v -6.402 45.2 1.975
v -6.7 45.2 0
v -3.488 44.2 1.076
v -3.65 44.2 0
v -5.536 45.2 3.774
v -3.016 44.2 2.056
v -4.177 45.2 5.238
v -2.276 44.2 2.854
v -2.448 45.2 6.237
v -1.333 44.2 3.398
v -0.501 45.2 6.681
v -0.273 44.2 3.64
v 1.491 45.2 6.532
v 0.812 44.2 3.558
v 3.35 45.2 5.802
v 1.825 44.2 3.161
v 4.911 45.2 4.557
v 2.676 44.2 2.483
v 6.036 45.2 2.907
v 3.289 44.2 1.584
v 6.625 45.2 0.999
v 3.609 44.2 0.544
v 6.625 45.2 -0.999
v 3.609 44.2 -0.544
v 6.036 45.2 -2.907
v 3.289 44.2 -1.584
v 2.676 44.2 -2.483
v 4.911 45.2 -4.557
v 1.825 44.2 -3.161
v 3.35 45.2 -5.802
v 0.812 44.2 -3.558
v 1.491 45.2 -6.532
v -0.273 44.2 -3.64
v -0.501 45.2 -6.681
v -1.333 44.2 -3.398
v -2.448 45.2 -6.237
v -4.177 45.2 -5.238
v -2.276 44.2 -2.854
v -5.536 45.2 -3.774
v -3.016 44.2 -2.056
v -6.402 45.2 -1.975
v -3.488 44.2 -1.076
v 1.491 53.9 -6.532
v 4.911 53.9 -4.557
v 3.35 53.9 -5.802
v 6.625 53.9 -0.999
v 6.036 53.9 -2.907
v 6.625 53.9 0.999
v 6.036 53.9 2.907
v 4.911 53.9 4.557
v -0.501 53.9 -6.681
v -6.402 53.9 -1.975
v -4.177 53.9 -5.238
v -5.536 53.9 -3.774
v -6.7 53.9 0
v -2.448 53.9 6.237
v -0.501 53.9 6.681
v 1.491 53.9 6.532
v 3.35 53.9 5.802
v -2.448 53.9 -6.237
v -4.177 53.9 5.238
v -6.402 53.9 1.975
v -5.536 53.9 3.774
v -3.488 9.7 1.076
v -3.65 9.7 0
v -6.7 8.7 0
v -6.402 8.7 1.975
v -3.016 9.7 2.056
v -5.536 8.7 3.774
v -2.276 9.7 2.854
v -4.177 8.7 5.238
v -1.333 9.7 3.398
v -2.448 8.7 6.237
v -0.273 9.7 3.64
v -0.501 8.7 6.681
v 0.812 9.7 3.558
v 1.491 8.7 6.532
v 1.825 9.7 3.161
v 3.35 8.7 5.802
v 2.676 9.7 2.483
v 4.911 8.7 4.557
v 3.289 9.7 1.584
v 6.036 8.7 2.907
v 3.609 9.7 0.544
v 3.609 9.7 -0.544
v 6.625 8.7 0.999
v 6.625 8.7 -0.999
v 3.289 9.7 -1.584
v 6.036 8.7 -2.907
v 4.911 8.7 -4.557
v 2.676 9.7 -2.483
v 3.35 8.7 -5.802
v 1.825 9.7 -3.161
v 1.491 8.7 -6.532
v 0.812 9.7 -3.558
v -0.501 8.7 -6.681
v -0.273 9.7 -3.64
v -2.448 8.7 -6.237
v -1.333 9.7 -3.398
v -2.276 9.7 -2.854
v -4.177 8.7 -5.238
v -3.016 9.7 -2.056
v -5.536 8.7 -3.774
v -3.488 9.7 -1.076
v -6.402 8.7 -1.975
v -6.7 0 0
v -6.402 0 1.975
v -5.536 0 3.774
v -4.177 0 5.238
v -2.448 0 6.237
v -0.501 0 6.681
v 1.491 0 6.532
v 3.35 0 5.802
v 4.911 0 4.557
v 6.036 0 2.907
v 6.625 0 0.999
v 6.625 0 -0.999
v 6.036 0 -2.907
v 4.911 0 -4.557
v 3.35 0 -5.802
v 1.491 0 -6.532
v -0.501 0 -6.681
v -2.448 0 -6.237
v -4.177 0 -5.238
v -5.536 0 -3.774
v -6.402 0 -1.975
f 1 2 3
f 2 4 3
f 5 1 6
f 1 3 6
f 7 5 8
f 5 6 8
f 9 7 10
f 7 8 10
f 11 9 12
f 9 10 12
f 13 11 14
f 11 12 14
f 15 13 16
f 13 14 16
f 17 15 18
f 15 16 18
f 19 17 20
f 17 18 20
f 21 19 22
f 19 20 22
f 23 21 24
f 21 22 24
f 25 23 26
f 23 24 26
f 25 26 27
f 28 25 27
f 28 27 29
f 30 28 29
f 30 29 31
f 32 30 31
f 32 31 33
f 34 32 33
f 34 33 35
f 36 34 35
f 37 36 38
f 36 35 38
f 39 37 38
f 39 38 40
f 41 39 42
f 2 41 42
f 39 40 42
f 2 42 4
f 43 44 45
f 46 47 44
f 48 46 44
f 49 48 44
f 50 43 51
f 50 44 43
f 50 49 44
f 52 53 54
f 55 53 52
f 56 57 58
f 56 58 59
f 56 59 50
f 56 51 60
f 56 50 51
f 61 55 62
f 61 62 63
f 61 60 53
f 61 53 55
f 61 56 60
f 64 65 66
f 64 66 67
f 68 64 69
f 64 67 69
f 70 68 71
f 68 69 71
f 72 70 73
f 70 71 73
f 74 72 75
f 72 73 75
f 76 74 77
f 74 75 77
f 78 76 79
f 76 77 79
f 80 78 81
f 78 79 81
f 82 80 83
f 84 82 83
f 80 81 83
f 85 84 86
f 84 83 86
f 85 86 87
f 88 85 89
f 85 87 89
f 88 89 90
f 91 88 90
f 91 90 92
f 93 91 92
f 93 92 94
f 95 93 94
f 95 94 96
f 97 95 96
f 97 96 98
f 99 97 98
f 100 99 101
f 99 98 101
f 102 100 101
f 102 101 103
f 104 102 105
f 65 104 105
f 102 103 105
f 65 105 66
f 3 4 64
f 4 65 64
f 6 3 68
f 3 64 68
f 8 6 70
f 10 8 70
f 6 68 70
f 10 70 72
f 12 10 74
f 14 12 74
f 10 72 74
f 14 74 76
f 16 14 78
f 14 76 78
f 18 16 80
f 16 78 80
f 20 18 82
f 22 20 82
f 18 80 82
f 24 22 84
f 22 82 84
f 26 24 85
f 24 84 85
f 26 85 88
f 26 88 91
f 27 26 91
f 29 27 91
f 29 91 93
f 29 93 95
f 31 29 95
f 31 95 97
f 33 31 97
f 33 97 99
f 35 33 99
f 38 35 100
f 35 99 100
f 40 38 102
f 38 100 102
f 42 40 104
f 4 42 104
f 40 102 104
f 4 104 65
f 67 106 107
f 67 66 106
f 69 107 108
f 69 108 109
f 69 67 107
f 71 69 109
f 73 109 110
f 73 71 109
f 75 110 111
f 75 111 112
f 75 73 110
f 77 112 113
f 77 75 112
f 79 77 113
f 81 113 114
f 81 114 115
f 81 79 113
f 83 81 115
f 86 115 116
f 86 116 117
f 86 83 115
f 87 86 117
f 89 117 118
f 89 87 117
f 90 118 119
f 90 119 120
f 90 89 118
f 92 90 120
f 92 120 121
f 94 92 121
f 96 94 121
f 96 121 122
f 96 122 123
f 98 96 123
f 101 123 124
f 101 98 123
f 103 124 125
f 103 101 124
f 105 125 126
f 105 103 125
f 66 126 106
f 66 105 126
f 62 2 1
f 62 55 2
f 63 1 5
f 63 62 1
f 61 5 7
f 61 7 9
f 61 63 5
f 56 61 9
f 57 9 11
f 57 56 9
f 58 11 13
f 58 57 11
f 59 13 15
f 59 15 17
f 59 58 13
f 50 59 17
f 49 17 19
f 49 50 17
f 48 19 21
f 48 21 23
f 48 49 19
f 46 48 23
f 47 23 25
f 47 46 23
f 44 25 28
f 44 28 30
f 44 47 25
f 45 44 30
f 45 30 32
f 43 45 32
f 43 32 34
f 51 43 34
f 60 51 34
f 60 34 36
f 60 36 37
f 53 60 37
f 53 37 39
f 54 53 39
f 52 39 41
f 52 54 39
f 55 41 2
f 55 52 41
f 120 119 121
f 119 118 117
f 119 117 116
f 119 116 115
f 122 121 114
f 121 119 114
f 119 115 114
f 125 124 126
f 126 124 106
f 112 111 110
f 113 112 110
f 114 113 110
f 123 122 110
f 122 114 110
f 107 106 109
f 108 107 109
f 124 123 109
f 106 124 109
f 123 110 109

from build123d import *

# Parameters (mm, degrees)
ESBO_O2_W = 6.7
ESBO_O2_H = 8.7


with BuildPart() as part:
    # Esboço2 → Revolução1 (revolve)
    with BuildSketch(Plane.XY):
        with Locations((-3.35, 49.55)):
            Rectangle(ESBO_O2_W, ESBO_O2_H)
        Polygon((-3.65, 44.2), (-3.65, 26.95), (0, 26.95), (0, 45.2), (-3.65, 45.2), align=None)
        Polygon((-3.65, 26.95), (-3.65, 9.7), (-3.65, 8.7), (0, 8.7), (0, 26.95), align=None)
        with Locations((-3.35, 4.35)):
            Rectangle(ESBO_O2_W, ESBO_O2_H)
        Polygon((-3.65, 9.7), (-6.7, 8.7), (-3.65, 8.7), align=None)
        Polygon((-6.7, 45.2), (-3.65, 44.2), (-3.65, 45.2), align=None)
    revolve(axis=Axis((0, -28.709318564, 0), (0, 1, 0)))


solid = part.part
